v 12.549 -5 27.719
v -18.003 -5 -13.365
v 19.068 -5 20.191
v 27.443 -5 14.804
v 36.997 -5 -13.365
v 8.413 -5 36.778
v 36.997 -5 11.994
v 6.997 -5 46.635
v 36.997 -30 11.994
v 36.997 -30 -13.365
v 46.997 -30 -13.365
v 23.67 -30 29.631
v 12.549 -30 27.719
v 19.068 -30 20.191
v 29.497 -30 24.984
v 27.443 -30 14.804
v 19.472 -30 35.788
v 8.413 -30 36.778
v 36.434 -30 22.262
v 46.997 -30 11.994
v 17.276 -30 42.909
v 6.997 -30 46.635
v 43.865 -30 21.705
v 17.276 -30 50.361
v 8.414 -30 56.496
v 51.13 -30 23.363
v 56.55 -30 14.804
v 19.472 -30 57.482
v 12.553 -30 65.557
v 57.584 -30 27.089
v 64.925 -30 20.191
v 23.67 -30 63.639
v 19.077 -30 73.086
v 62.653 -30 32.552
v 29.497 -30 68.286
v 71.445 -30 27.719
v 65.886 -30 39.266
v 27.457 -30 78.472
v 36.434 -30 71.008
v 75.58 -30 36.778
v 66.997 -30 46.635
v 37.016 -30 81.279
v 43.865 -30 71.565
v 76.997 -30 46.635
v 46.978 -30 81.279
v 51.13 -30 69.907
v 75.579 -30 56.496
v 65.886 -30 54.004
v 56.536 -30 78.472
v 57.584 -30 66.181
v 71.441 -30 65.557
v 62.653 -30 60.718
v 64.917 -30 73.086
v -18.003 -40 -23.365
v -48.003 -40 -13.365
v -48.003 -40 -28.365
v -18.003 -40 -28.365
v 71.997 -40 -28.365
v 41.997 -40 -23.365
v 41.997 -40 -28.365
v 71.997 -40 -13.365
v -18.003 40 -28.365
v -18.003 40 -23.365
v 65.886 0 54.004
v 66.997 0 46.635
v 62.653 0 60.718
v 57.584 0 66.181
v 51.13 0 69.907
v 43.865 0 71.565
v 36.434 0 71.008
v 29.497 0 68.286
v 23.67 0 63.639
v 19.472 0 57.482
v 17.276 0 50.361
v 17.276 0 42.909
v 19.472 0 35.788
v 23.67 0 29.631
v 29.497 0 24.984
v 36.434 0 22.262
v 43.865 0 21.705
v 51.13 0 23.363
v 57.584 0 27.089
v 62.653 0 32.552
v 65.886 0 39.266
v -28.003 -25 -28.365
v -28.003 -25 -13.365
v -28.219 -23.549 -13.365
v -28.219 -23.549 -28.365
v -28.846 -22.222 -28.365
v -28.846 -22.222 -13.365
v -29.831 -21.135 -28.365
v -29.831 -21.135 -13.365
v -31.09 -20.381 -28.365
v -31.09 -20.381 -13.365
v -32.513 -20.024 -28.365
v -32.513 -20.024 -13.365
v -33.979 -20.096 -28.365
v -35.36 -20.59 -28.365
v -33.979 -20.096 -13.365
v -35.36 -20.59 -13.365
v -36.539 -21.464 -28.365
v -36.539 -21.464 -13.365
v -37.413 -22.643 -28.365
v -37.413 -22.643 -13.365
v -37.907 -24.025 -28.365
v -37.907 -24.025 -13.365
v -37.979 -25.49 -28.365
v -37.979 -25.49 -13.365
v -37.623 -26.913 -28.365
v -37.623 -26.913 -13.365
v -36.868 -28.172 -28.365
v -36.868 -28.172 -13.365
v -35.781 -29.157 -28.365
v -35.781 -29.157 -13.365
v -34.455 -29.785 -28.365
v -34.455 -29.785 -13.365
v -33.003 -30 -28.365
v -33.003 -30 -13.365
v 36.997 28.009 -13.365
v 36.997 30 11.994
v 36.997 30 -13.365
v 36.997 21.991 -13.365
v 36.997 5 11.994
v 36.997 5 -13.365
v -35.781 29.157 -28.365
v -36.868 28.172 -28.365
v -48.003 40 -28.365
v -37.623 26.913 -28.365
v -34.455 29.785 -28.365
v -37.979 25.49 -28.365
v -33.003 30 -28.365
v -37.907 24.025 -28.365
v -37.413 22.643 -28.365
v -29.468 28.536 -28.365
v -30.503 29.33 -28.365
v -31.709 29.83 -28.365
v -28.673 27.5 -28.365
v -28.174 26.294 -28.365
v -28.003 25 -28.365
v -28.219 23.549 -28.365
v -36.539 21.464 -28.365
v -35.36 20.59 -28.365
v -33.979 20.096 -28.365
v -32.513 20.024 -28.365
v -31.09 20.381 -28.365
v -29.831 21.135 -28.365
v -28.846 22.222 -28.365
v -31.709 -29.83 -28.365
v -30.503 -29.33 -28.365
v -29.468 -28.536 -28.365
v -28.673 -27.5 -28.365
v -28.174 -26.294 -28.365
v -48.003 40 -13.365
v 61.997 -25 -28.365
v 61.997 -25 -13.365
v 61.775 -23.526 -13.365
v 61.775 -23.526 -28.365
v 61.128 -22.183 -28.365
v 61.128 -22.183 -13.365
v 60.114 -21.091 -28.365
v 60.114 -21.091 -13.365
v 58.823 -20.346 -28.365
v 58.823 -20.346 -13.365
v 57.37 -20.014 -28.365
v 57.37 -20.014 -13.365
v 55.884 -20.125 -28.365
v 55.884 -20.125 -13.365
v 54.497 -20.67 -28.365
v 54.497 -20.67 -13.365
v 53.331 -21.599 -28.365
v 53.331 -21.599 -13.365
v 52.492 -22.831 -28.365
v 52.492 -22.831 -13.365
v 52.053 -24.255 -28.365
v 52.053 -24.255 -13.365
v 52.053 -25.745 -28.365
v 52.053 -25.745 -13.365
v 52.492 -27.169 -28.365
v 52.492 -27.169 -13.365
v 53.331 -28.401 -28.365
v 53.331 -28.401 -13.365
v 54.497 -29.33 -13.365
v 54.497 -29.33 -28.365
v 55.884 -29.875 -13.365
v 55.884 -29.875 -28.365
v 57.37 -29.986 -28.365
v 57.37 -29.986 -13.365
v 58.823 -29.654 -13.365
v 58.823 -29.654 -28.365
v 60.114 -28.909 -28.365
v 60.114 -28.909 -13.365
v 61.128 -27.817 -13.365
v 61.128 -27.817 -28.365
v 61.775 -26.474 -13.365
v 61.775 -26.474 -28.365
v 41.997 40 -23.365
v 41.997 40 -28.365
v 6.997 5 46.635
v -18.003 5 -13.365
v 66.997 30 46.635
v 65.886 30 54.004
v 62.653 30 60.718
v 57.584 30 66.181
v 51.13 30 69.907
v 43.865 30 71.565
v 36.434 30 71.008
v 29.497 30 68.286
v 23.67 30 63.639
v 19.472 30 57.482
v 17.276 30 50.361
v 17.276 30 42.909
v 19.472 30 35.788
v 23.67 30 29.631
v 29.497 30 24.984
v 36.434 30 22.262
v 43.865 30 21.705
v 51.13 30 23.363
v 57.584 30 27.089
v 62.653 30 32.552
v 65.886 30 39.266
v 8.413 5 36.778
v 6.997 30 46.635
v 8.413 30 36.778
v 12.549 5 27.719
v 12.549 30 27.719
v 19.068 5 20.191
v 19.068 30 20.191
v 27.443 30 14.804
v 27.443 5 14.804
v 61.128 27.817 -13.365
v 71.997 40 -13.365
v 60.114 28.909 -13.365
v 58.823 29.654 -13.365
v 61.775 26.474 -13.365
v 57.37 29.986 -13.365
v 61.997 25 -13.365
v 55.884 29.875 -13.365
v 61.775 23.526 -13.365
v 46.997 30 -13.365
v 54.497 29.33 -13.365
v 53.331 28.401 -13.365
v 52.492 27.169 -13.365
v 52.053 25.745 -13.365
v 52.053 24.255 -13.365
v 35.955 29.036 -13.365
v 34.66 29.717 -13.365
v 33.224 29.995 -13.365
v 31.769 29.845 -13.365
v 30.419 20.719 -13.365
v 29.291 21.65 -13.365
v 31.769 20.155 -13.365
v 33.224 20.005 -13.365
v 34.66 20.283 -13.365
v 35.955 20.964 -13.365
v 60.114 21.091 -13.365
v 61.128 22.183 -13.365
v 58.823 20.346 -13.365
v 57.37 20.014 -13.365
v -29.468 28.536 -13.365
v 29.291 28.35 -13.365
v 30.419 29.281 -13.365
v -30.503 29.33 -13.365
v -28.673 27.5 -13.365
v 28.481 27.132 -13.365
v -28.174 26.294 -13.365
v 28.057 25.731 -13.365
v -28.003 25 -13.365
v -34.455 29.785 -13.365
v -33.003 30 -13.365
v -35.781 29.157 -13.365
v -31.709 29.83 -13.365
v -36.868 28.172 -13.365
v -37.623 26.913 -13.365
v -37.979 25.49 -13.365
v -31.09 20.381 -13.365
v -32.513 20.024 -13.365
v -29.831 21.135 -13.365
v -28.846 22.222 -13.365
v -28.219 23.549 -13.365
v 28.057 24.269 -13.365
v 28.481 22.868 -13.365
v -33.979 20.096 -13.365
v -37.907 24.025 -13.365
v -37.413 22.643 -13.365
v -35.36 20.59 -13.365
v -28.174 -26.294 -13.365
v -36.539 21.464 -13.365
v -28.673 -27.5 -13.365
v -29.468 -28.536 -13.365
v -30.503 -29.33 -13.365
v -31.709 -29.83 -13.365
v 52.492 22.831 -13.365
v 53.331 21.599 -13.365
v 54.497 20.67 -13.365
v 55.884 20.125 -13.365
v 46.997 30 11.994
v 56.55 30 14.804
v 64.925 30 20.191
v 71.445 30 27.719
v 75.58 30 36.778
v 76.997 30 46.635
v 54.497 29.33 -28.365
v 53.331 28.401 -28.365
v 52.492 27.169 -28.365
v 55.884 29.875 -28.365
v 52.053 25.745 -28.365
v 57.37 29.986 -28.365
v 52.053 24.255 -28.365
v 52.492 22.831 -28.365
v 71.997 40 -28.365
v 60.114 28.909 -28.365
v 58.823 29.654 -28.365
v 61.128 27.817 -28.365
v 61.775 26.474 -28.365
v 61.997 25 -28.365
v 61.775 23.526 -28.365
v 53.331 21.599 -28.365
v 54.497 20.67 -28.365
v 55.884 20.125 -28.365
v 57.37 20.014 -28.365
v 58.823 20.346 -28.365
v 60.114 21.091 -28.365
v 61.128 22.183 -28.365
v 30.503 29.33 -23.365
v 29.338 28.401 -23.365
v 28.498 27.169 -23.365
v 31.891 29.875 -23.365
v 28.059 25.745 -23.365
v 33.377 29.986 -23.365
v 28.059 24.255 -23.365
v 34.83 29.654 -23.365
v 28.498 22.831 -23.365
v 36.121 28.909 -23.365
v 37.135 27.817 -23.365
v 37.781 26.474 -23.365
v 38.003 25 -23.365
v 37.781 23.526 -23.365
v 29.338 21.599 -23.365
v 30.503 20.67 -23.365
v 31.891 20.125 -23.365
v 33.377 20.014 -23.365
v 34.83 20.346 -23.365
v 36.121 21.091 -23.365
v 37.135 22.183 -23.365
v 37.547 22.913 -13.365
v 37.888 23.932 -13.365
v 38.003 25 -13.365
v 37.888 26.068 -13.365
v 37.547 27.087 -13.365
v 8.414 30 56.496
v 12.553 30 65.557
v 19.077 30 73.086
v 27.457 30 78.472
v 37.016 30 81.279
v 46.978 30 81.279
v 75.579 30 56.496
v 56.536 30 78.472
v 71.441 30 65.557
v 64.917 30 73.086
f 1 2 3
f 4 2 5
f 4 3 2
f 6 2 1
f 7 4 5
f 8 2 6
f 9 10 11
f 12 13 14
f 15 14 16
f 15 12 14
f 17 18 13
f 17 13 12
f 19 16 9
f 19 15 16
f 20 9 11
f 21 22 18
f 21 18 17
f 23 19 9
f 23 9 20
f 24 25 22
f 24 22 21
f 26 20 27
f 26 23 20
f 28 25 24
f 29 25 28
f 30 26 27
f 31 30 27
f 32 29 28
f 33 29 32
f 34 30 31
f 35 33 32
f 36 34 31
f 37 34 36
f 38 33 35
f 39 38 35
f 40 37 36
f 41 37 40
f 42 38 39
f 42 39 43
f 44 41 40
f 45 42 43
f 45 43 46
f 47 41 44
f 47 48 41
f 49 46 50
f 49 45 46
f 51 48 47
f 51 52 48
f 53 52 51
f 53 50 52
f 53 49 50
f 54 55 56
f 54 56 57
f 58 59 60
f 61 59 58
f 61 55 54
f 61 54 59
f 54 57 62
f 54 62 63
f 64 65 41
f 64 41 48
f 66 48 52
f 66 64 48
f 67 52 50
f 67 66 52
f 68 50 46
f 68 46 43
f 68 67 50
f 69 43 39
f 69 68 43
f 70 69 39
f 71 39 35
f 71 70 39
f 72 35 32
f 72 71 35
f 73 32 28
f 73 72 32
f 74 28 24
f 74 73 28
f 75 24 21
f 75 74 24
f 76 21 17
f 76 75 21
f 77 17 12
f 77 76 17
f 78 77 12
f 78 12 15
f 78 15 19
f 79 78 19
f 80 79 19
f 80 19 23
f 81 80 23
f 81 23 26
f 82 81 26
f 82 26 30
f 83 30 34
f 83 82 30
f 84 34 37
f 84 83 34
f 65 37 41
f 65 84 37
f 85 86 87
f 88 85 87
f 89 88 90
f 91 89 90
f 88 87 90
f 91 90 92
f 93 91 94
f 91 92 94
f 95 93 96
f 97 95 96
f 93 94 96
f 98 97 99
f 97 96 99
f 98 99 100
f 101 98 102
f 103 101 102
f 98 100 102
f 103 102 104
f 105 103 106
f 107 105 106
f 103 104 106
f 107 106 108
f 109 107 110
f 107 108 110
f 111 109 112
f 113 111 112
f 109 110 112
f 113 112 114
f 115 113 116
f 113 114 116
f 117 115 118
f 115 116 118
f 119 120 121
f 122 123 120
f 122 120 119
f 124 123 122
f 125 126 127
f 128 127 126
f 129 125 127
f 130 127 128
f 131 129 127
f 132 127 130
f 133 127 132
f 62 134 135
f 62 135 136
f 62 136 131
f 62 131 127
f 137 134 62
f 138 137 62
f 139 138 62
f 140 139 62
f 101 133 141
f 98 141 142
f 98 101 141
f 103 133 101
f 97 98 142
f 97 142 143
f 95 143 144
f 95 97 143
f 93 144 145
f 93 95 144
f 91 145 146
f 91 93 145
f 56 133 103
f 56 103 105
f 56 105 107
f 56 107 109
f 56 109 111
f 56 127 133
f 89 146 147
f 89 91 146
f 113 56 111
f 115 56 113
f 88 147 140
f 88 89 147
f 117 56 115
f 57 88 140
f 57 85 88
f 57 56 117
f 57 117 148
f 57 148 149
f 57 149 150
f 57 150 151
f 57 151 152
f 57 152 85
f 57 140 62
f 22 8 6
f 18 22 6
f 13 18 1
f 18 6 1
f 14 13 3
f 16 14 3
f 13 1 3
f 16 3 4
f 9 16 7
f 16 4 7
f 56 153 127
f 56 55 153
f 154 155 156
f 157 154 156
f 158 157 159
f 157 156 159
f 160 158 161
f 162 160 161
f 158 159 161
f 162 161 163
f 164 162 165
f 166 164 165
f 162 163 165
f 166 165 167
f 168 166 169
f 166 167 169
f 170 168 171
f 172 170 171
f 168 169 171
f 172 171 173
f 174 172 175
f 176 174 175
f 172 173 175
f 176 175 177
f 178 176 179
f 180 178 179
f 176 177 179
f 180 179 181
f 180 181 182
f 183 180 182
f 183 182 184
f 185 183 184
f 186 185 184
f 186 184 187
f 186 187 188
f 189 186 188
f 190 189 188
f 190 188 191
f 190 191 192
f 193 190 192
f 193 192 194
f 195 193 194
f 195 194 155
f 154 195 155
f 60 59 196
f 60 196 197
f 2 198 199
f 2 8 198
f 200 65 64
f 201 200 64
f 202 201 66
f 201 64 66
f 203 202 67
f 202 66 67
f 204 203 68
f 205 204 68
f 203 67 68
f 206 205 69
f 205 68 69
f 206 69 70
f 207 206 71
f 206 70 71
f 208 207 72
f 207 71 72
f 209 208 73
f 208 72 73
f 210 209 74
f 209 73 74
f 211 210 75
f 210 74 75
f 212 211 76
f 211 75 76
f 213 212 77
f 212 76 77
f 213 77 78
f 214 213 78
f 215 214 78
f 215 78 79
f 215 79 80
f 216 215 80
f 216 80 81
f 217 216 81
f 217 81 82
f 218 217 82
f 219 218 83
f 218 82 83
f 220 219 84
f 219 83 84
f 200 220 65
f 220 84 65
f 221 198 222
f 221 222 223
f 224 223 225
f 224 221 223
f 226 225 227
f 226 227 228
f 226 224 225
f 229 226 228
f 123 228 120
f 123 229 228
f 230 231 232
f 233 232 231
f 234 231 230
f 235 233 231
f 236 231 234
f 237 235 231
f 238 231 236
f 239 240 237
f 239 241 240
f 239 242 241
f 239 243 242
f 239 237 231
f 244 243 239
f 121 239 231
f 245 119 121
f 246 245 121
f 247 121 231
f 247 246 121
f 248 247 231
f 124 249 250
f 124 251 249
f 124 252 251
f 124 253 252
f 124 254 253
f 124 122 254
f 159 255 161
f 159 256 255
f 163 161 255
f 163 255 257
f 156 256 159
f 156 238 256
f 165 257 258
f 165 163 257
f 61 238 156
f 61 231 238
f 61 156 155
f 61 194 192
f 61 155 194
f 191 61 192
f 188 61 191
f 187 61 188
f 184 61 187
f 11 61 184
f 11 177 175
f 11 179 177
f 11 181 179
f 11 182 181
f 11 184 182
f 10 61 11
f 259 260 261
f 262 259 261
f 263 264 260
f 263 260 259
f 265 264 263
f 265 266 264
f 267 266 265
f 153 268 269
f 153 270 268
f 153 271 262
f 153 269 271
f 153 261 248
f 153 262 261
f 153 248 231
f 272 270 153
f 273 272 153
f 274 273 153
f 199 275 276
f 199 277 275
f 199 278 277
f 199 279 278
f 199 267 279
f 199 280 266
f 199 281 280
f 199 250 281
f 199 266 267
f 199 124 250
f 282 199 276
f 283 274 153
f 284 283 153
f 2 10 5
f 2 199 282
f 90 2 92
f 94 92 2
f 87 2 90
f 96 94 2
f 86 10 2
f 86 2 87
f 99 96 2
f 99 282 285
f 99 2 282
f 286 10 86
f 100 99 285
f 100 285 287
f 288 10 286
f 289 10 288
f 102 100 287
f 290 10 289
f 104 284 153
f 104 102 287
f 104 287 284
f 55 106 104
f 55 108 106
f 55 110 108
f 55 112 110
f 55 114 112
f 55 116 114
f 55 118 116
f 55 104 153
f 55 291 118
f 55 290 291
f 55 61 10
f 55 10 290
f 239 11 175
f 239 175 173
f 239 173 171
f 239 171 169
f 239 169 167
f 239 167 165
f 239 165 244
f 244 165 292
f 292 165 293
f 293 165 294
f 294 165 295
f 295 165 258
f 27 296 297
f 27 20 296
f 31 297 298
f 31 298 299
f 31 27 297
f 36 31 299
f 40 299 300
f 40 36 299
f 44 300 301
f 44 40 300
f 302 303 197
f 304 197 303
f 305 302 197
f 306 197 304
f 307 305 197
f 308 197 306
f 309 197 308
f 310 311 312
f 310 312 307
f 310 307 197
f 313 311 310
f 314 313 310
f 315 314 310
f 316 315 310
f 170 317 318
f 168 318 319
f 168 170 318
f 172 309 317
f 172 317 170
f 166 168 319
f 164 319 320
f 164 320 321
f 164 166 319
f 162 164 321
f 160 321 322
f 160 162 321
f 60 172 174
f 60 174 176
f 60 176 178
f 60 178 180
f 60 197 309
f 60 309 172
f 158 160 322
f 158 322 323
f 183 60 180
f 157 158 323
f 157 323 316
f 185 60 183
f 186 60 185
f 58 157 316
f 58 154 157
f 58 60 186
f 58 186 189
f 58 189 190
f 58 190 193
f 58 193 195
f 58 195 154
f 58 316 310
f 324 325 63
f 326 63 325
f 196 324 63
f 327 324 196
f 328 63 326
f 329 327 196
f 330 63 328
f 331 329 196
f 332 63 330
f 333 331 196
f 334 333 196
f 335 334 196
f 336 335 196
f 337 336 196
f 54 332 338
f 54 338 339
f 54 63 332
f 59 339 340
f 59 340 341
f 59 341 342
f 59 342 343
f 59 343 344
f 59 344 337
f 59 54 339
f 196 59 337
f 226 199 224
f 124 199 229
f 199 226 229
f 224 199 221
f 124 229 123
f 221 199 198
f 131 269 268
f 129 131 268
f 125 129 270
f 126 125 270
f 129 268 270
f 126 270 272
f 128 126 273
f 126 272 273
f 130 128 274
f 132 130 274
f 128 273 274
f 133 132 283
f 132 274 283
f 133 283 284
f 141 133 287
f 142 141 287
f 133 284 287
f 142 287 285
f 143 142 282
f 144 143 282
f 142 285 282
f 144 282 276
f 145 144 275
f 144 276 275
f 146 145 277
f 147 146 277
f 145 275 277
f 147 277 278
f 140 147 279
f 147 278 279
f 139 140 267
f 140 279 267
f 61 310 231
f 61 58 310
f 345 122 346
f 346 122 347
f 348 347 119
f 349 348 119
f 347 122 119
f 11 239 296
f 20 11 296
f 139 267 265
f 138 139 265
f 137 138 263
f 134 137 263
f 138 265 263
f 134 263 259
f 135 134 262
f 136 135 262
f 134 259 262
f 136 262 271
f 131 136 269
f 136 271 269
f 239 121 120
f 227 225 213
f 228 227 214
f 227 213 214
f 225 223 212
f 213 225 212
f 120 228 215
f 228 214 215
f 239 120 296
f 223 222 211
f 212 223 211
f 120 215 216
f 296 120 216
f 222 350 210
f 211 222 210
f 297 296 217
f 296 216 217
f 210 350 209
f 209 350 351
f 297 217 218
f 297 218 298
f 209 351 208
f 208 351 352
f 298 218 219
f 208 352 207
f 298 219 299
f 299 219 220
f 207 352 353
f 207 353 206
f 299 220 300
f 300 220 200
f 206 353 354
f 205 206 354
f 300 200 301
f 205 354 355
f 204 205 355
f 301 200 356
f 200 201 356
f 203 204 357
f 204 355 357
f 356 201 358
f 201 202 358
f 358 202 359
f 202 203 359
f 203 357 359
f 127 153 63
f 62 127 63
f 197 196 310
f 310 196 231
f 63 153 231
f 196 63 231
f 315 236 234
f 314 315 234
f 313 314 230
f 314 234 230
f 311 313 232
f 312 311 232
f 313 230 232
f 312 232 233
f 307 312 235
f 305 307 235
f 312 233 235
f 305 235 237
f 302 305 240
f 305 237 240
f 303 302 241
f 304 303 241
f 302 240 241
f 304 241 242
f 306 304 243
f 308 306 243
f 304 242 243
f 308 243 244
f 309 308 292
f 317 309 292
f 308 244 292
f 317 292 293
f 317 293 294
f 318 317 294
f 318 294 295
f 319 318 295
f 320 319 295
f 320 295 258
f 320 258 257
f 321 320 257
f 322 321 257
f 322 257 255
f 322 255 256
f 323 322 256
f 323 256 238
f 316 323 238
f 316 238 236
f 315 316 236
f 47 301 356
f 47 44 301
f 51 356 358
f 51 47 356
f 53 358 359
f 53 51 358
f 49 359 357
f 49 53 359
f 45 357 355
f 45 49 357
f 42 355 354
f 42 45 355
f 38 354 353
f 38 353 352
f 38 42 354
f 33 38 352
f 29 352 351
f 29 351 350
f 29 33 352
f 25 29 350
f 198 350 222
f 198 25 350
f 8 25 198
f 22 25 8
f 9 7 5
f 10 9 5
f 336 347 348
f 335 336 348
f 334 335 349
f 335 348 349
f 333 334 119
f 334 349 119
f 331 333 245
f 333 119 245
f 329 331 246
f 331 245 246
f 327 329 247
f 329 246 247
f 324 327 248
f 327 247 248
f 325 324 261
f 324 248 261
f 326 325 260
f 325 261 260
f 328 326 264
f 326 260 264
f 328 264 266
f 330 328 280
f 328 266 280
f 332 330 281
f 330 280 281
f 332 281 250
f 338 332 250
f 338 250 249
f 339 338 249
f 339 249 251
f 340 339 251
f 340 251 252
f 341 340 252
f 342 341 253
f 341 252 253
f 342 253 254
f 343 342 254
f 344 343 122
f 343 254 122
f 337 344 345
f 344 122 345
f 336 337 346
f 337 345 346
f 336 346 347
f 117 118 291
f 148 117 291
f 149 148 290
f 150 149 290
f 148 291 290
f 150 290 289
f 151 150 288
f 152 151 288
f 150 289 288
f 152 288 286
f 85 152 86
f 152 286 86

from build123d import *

# Parameters (mm, degrees)
F1_DEPTH      = 40
F1_DEPTH_BACK = 40
F2_DEPTH      = 5
F2_DEPTH_BACK = 5
F0_R          = 25
F3_DEPTH      = 30
F3_DEPTH_BACK = 30
F4_R          = 5
F5_DEPTH      = 25


with BuildPart() as f1:
    # F0 (on Front) → F1 (new body, two sides)
    with BuildSketch(Plane.XZ) as f1_sk:
        Polygon((-18.003343, -13.36493), (-48.003343, -13.36493), (-48.003343, -28.36493), (-18.003343, -28.36493), (-18.003343, -23.36493), (41.996657, -23.36493), (41.996657, -28.36493), (71.996657, -28.36493), (71.996657, -13.36493), (46.996657, -13.36493), (41.996657, -13.36493), (36.996657, -13.36493), align=None)
    extrude(amount=F1_DEPTH)
    extrude(f1_sk.sketch, amount=-F1_DEPTH_BACK)

    # F0 (on Front) → F2 (join, two sides)
    with BuildSketch(Plane.XZ) as f2_sk:
        with BuildLine():
            Line((6.996657, 46.63507), (-18.003343, -13.36493))
            Line((-18.003343, -13.36493), (36.996657, -13.36493))
            Line((36.996657, -13.36493), (36.996657, 11.994054))
            ThreePointArc((36.996657, 11.994054), (15.539144, 23.722191), (6.996657, 46.63507))
        make_face()
    extrude(amount=F2_DEPTH)
    extrude(f2_sk.sketch, amount=-F2_DEPTH_BACK)

    # F0 (on Front) → F3 (join, two sides)
    with BuildSketch(Plane.XZ) as f3_sk:
        with BuildLine():
            ThreePointArc((76.996657, 46.63507), (41.996657, 81.63507), (6.996657, 46.63507))
            ThreePointArc((6.996657, 46.63507), (15.539144, 23.722191), (36.996657, 11.994054))
            ThreePointArc((36.996657, 11.994054), (41.996657, 11.63507), (46.996657, 11.994054))
            ThreePointArc((46.996657, 11.994054), (68.45417, 23.722191), (76.996657, 46.63507))
        make_face()
        with Locations((41.996657, 46.63507)):
            Circle(F0_R, mode=Mode.SUBTRACT)
        with BuildLine():
            Line((36.996657, 11.994054), (36.996657, -13.36493))
            Line((36.996657, -13.36493), (41.996657, -13.36493))
            Line((41.996657, -13.36493), (46.996657, -13.36493))
            Line((46.996657, -13.36493), (46.996657, 11.994054))
            ThreePointArc((46.996657, 11.994054), (41.996657, 11.63507), (36.996657, 11.994054))
        make_face()
    extrude(amount=F3_DEPTH)
    extrude(f3_sk.sketch, amount=-F3_DEPTH_BACK)

    # F4 (on face) → F5 (cut)
    with BuildSketch(Plane.XY.offset(-13.36493)):
        with BuildLine():
            ThreePointArc((-33.003343, -30), (-29.467809, -28.535534), (-28.003343, -25))
            ThreePointArc((-28.003343, -25), (-36.538877, -21.464466), (-33.003343, -30))
        make_face()
        with BuildLine():
            ThreePointArc((-33.003343, 30), (-36.538877, 21.464466), (-28.003343, 25))
            ThreePointArc((-28.003343, 25), (-29.467809, 28.535534), (-33.003343, 30))
        make_face()
        with Locations((33.003343, 25)):
            Circle(F4_R)
        with Locations((56.996657, -25)):
            Circle(F4_R)
        with Locations((56.996657, 25)):
            Circle(F4_R)
    extrude(amount=-F5_DEPTH, mode=Mode.SUBTRACT)


solid = f1.part
